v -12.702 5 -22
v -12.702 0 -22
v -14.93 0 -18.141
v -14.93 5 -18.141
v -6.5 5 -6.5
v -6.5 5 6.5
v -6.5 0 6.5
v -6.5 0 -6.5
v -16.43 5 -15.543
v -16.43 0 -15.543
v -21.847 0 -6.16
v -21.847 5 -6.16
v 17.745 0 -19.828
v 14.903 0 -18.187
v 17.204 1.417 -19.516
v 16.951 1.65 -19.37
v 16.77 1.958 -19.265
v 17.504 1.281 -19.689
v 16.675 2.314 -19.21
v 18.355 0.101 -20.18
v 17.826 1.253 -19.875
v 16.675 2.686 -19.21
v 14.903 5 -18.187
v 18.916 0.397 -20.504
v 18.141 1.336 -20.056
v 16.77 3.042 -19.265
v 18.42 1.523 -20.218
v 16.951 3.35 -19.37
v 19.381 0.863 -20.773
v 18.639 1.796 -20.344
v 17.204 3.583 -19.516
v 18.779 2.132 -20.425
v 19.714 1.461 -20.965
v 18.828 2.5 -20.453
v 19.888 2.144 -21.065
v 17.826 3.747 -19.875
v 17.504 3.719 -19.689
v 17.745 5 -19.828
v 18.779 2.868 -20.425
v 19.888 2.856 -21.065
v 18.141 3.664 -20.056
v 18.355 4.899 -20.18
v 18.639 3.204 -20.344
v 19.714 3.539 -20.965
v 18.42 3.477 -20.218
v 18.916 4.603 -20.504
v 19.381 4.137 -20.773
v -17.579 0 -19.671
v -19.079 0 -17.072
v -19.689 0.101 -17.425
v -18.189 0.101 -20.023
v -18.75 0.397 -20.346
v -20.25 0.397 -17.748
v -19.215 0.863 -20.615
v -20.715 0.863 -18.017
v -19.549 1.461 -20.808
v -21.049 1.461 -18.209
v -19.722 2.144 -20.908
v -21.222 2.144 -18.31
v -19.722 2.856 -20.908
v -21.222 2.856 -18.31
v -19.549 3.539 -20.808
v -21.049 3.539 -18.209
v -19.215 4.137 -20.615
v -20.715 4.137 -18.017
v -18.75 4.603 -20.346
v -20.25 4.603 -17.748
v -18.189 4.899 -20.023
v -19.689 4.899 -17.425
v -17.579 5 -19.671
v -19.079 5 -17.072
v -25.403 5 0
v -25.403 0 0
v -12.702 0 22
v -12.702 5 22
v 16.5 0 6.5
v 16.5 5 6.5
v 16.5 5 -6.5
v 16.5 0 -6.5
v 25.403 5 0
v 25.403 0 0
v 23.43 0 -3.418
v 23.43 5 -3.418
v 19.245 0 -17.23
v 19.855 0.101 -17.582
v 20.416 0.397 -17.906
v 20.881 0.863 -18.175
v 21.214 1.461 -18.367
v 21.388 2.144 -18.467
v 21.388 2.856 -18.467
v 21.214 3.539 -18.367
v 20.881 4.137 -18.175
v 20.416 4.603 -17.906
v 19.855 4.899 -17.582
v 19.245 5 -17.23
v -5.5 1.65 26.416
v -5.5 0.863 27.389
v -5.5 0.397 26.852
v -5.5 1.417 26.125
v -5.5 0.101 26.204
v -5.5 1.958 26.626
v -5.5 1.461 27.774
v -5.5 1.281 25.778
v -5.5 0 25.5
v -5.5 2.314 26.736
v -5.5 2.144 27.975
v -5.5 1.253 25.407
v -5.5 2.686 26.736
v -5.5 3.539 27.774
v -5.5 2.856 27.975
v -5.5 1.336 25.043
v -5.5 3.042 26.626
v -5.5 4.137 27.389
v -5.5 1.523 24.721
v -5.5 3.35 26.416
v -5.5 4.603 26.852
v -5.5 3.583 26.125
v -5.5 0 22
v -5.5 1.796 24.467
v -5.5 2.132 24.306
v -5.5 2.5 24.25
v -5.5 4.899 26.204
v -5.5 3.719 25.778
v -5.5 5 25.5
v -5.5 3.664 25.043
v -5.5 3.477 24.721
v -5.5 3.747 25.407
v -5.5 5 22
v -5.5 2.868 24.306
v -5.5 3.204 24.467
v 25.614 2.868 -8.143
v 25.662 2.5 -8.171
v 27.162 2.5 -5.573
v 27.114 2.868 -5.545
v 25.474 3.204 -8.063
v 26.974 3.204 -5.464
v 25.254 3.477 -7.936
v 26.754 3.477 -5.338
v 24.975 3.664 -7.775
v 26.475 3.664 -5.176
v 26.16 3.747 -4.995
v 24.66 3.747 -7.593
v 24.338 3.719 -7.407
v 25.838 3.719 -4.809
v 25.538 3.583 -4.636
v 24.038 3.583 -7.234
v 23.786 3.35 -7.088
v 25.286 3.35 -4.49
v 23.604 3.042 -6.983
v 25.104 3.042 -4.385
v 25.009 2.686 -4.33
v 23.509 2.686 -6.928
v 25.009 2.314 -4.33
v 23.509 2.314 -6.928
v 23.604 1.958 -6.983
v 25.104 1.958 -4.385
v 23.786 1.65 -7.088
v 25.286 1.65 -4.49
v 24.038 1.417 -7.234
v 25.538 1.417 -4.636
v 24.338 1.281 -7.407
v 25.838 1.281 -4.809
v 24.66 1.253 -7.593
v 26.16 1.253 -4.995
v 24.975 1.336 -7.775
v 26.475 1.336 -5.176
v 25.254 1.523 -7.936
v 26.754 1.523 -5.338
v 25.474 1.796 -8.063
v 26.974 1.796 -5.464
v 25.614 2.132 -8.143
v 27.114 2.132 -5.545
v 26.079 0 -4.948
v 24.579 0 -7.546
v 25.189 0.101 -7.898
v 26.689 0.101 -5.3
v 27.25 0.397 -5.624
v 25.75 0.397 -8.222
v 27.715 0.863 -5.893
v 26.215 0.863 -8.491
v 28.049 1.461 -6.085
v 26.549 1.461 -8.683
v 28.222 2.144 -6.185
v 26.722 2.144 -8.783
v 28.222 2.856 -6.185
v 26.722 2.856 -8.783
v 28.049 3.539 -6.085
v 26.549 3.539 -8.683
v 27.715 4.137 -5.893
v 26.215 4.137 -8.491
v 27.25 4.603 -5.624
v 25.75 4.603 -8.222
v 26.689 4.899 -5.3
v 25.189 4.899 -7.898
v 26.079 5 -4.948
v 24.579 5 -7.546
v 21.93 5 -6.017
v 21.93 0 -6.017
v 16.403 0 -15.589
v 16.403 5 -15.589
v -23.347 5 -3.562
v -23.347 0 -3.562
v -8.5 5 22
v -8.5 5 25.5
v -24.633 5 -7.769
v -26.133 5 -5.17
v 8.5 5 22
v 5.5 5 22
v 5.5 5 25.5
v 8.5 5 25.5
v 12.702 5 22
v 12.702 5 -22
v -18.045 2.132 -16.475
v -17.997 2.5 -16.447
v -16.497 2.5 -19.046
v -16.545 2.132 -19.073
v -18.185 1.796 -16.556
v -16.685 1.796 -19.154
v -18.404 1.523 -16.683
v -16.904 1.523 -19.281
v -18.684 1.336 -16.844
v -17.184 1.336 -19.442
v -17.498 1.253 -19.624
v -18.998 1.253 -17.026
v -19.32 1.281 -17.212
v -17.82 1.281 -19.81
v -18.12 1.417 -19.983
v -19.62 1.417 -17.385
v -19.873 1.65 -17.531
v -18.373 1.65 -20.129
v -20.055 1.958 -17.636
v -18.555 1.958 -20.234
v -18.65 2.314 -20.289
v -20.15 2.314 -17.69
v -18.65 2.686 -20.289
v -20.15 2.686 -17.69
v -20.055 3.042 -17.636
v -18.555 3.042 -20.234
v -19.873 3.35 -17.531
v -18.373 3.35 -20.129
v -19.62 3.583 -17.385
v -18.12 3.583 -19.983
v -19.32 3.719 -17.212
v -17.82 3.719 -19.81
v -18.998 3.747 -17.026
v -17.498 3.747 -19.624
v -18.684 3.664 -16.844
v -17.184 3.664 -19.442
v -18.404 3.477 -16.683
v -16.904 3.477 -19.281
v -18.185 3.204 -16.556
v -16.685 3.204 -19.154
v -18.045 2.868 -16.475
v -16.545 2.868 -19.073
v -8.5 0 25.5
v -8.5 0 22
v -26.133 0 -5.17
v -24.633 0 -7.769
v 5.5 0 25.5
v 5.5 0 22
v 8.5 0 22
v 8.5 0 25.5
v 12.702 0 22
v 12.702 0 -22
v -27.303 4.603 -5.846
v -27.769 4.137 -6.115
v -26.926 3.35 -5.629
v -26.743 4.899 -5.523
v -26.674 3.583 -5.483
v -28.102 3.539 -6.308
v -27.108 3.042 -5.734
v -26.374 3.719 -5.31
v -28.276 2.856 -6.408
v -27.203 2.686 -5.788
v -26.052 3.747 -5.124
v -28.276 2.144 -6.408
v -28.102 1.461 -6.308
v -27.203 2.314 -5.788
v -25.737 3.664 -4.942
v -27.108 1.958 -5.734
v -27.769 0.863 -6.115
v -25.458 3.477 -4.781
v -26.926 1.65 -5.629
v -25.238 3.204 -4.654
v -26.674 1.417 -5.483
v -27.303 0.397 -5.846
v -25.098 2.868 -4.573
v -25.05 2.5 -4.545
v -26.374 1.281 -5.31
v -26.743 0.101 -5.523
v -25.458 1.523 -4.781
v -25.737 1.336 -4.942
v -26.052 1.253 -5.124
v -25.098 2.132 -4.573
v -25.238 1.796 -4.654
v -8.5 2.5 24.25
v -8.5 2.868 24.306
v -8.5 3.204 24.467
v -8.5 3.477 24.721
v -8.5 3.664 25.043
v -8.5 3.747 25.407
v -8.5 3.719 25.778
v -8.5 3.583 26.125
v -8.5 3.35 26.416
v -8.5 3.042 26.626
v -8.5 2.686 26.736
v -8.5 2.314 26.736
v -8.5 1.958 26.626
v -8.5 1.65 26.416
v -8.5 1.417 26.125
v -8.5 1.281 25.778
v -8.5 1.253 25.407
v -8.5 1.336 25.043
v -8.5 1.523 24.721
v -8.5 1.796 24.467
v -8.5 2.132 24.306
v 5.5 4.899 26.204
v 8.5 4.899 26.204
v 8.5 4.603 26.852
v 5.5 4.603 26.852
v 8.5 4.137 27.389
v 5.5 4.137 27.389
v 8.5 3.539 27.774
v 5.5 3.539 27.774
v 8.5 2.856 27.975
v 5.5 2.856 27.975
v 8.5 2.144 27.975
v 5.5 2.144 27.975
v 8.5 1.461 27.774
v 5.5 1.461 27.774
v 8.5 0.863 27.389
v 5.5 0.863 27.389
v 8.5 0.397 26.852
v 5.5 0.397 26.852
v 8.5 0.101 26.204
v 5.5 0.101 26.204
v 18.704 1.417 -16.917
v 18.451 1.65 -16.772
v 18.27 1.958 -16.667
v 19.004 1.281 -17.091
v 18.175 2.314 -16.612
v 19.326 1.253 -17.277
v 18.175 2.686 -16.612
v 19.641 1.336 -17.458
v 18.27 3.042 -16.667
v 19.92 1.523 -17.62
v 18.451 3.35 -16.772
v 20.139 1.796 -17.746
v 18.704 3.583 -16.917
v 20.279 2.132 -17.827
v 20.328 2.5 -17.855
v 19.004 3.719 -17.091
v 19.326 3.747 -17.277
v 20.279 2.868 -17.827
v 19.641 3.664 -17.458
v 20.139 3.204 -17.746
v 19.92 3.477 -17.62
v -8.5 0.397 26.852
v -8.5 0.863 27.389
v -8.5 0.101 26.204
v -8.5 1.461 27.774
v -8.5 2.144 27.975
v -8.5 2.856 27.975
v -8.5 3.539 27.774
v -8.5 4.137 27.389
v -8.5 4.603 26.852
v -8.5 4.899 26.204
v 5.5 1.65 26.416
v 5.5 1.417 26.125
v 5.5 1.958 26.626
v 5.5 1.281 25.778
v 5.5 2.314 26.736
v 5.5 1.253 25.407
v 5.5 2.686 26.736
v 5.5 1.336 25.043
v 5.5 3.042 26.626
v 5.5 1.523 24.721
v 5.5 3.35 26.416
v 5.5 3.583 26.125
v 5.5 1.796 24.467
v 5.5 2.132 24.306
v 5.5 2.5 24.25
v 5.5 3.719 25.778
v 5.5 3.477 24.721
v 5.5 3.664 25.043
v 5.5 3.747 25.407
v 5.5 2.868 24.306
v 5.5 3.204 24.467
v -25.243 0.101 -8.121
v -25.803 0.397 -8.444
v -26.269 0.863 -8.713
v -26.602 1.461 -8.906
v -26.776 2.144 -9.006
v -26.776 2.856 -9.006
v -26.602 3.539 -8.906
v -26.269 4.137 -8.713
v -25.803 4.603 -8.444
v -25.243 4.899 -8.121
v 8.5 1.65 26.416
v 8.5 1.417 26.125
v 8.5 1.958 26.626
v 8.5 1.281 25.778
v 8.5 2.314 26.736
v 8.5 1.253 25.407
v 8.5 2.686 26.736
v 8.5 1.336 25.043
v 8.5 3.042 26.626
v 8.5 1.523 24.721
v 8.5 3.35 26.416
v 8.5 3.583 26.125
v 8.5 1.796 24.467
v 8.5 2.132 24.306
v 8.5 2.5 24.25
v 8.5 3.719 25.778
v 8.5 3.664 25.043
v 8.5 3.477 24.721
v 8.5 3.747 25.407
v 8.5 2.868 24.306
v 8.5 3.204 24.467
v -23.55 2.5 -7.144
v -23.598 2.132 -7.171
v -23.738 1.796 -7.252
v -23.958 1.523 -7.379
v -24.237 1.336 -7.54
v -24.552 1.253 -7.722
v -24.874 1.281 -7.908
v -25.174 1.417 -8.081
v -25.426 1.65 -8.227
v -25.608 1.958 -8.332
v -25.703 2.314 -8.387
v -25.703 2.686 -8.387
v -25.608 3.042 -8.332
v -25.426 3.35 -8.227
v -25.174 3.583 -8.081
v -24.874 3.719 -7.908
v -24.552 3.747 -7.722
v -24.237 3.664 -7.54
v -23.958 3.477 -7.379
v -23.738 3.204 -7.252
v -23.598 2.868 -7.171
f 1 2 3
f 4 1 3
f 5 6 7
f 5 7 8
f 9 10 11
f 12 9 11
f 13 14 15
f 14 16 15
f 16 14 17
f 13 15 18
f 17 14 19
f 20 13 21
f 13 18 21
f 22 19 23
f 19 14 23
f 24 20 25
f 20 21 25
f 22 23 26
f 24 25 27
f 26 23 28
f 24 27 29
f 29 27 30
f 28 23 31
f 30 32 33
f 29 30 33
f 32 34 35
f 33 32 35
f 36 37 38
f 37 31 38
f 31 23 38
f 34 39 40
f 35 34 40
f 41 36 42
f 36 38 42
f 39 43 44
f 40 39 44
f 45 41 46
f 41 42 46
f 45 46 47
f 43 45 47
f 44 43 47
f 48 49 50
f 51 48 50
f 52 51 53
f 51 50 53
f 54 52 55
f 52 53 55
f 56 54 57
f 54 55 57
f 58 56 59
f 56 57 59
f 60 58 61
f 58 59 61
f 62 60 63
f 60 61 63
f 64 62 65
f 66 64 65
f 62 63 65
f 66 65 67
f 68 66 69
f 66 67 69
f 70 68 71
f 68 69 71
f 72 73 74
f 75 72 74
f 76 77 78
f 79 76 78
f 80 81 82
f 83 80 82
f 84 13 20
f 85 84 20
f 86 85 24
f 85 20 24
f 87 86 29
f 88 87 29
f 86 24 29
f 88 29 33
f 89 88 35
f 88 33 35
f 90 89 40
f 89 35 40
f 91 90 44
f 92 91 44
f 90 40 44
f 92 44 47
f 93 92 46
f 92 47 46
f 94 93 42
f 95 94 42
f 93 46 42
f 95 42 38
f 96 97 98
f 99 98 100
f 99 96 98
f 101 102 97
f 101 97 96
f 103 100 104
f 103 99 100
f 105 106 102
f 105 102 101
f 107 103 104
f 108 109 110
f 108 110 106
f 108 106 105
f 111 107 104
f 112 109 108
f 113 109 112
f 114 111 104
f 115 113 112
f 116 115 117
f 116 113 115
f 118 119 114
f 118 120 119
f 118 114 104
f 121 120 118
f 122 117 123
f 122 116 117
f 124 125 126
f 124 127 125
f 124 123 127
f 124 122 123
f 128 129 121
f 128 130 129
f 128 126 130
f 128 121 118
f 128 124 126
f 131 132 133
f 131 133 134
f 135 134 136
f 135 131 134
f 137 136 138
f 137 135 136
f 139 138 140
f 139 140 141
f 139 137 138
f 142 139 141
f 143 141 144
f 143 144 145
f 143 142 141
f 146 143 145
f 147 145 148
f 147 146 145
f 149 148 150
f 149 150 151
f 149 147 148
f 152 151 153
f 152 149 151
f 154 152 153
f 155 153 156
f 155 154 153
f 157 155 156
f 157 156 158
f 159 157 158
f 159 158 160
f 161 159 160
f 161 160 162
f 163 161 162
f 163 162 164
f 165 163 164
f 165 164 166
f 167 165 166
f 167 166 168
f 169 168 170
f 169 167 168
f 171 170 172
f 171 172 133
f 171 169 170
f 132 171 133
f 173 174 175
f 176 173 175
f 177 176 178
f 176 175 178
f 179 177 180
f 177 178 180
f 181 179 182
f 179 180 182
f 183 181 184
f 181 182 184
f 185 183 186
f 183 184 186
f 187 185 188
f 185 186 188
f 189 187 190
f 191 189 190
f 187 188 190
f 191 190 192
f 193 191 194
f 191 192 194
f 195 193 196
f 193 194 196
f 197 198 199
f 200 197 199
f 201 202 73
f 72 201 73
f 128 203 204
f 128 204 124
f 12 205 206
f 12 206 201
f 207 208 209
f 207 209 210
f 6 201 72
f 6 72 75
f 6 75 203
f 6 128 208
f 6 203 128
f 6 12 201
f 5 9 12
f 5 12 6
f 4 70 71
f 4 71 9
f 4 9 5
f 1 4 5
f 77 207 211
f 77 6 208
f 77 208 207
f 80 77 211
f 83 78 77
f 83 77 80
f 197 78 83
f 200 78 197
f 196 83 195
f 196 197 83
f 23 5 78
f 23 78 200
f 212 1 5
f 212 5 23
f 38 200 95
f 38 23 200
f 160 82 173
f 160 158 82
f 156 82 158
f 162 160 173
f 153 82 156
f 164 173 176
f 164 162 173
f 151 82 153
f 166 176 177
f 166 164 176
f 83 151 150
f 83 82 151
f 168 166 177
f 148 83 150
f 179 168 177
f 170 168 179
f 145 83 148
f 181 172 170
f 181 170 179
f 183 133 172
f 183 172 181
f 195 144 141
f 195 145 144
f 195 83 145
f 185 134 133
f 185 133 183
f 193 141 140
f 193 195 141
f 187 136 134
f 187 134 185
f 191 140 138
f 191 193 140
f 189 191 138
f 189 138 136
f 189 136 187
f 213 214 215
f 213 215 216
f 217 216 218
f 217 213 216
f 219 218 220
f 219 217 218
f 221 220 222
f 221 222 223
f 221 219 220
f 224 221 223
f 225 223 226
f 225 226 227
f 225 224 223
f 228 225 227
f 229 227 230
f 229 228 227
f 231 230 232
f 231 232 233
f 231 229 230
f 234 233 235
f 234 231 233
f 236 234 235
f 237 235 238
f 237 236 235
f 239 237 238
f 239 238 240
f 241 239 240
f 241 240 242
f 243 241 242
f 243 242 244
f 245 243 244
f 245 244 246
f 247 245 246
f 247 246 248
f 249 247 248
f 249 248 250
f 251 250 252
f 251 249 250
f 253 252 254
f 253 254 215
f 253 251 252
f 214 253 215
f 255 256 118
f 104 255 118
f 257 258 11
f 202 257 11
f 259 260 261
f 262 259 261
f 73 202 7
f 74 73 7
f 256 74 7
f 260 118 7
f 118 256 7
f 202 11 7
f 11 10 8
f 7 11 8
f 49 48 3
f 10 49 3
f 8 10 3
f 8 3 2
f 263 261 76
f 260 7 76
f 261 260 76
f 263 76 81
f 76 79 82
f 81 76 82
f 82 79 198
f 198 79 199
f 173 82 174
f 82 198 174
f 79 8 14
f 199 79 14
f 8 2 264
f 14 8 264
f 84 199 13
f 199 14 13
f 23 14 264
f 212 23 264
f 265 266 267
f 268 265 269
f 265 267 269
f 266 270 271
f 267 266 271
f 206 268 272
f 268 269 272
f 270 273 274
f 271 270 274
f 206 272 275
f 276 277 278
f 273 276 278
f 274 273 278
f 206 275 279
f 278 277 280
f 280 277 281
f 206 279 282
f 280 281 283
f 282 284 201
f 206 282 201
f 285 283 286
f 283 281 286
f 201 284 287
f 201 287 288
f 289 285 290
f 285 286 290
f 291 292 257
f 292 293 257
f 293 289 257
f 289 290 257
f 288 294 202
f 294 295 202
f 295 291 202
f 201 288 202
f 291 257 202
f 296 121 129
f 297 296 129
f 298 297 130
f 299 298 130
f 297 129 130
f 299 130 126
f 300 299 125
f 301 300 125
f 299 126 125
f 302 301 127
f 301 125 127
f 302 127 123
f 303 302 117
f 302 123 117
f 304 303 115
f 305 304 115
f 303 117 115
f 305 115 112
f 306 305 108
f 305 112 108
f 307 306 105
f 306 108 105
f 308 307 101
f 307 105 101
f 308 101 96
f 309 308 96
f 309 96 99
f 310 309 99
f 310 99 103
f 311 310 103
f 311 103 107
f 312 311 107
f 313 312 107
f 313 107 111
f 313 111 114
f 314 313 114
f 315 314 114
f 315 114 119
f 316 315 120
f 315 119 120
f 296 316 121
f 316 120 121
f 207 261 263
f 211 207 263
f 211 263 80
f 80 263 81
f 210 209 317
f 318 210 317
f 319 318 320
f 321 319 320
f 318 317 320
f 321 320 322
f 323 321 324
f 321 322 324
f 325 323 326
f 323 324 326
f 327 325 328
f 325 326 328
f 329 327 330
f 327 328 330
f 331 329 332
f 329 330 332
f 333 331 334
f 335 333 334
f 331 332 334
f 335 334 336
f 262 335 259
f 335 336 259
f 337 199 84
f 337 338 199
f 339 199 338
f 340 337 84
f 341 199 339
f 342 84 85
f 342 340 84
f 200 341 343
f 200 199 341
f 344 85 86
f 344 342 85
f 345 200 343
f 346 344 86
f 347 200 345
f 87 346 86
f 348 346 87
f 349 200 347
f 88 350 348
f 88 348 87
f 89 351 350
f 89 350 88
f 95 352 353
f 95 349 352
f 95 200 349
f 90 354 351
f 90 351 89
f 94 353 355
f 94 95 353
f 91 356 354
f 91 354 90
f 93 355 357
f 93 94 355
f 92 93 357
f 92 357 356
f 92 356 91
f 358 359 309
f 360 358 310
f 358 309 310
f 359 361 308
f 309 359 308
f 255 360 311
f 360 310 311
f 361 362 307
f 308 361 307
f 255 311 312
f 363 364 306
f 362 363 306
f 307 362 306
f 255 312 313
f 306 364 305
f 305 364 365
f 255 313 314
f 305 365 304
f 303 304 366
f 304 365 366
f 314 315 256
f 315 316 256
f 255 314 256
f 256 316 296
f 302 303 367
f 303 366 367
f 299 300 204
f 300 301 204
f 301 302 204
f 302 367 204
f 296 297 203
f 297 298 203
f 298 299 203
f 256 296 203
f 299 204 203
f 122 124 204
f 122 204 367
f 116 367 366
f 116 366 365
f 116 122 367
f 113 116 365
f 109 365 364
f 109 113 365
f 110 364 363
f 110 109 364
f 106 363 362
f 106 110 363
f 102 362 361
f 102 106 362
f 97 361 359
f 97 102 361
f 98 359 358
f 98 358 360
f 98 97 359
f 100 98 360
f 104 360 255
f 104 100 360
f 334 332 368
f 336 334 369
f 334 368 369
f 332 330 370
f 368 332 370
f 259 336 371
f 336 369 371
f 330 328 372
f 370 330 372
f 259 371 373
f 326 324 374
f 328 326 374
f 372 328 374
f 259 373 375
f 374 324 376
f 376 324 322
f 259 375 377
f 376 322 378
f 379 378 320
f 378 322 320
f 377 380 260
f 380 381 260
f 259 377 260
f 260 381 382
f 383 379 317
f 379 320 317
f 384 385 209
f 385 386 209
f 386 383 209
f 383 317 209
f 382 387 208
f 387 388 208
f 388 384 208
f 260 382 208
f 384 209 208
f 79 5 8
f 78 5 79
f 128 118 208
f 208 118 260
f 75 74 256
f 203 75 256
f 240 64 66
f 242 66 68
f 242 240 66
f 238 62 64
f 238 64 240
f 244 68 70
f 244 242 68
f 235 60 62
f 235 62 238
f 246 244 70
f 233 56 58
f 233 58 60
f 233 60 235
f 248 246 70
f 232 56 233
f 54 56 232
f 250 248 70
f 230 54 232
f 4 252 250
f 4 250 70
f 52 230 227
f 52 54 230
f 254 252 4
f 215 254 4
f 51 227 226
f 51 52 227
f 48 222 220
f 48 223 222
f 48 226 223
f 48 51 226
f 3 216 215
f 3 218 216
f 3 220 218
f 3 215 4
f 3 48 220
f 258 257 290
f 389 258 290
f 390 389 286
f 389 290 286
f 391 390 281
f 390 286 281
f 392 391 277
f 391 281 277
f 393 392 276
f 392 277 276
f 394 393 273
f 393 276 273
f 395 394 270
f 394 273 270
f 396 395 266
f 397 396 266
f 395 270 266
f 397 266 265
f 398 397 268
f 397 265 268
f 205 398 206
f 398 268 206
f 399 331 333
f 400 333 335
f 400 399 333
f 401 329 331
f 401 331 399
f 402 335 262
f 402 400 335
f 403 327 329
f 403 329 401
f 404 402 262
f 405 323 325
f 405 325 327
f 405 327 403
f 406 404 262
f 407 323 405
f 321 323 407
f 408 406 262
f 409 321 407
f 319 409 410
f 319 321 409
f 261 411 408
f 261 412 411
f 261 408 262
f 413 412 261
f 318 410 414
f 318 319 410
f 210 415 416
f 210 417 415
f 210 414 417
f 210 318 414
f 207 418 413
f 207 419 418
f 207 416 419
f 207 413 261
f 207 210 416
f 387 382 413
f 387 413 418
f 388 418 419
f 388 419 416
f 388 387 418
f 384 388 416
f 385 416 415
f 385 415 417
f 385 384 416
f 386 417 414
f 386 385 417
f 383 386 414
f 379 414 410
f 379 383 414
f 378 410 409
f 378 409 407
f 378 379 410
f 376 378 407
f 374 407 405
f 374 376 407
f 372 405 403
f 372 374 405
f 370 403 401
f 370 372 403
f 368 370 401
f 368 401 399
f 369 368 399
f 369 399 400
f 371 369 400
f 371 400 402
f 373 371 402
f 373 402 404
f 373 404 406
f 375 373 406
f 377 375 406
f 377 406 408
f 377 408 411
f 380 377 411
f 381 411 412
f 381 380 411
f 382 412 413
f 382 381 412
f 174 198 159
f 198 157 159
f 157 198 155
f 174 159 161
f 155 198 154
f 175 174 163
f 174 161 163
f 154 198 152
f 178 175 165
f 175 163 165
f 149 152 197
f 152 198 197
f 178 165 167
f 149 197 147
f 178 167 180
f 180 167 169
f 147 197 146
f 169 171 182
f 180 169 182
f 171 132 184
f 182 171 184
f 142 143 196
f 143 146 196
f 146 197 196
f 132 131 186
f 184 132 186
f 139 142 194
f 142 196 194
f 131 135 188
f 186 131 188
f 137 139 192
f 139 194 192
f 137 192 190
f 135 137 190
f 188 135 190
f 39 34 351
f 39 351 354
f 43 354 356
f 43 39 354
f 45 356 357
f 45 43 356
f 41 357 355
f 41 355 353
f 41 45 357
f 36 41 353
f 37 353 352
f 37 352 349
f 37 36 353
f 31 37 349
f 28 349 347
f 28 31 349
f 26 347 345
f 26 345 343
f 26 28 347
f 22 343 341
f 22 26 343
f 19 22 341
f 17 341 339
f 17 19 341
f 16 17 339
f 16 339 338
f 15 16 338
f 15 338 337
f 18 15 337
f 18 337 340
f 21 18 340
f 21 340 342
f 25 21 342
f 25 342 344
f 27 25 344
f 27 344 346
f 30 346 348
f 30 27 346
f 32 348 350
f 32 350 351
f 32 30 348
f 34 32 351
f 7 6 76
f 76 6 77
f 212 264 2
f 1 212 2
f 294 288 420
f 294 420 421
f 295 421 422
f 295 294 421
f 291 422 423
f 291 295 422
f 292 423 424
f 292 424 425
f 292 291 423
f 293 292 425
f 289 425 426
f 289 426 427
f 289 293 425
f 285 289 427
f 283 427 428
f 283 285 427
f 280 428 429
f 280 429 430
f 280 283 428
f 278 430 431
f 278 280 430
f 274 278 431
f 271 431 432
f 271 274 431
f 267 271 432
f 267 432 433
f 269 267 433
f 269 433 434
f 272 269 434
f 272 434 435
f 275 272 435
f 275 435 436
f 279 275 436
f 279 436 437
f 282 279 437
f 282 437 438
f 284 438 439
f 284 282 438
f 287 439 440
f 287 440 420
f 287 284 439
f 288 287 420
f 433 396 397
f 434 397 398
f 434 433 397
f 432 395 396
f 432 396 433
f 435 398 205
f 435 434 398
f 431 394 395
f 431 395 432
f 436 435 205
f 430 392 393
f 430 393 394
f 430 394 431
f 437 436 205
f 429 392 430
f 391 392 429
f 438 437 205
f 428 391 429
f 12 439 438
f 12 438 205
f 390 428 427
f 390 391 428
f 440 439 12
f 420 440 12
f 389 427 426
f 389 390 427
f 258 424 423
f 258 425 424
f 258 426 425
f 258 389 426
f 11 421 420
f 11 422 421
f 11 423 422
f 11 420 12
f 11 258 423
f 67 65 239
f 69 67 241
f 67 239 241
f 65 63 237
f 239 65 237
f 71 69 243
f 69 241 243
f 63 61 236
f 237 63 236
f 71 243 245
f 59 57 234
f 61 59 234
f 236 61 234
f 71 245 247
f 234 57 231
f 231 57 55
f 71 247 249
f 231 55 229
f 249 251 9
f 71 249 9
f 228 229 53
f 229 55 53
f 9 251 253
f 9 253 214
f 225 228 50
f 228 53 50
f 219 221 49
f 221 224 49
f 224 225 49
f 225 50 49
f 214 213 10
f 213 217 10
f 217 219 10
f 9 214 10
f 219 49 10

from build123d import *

# Parameters (mm, degrees)
BOSS_EXTRUDE1_DEPTH     = 5
BOSS_EXTRUDE2_START     = 5.5
SKETCH2_R               = 1.25
BOSS_EXTRUDE2_DEPTH     = 3
CIRPATTERN1_START       = -8.29907709
CIRPATTERN1_OUTLINE_R   = 1.25
CIRPATTERN1_DEPTH       = 3
CIRPATTERN1_START_2     = 5.754432
CIRPATTERN1_2_OUTLINE_R = 1.25
CIRPATTERN1_2_DEPTH     = 3
CIRPATTERN1_START_3     = -8.588604314
CIRPATTERN1_3_OUTLINE_R = 1.25
CIRPATTERN1_3_DEPTH     = 3
CIRPATTERN1_START_4     = 5.245568
CIRPATTERN1_4_OUTLINE_R = 1.25
CIRPATTERN1_4_DEPTH     = 3
CUT_EXTRUDE1_REACH      = 42.122
SKETCH3_W               = 23
SKETCH3_H               = 13


# Read off the part's stored shape, not the designer's step: CirPattern1
with BuildPart() as part:
    # Sketch1 → Boss-Extrude1 (new body)
    with BuildSketch(Plane(origin=(0, 0, 0), x_dir=(1, 0, 0), z_dir=(0, 1, 0))):
        Polygon((25.403411844, 0), (12.701705922, 22), (-12.701705922, 22), (-25.403411844, 0), (-12.701705922, -22), (12.701705922, -22), align=None)
    extrude(amount=BOSS_EXTRUDE1_DEPTH)

    # Sketch2 → Boss-Extrude2 (add)
    with BuildSketch(Plane(origin=(0, 0, 0), x_dir=(0, 0, -1), z_dir=(1, 0, 0)).offset(BOSS_EXTRUDE2_START)):
        with BuildLine():
            Line((-22, 5), (-25.5, 5))
            ThreePointArc((-25.5, 5), (-28, 2.5), (-25.5, 0))
            Line((-25.5, 0), (-22, 0))
            Line((-22, 0), (-22, 5))
        make_face()
        with Locations((-25.5, 2.5)):
            Circle(SKETCH2_R, mode=Mode.SUBTRACT)
    boss_extrude2 = extrude(amount=BOSS_EXTRUDE2_DEPTH)

    # Mirror1: Boss-Extrude2 across plane
    add(boss_extrude2.mirror(Plane(origin=(0, 0, 0), x_dir=(0, 0, 1), z_dir=(1, 0, 0))))

    # CirPattern1 outline → CirPattern1 (add)
    with BuildSketch(Plane(origin=(0, 0, 0), x_dir=(0.8660254037844362, 0, -0.5000000000000042), z_dir=(0.5000000000000042, 0, 0.8660254037844363)).offset(CIRPATTERN1_START)):
        with BuildLine():
            Line((25.281685655, 5), (22, 5))
            Line((22, 5), (22, 0))
            Line((22, 0), (25.281685655, 0))
            ThreePointArc((25.281685655, 0), (27.781685655, 2.5), (25.281685655, 5))
        make_face()
        with Locations((25.281685655, 2.5)):
            Circle(CIRPATTERN1_OUTLINE_R, mode=Mode.SUBTRACT)
    extrude(amount=CIRPATTERN1_DEPTH)

    # CirPattern1 2 outline → CirPattern1 2 (add)
    with BuildSketch(Plane(origin=(0, 0, 0), x_dir=(0.8660254037844362, 0, -0.5000000000000042), z_dir=(0.5000000000000042, 0, 0.8660254037844363)).offset(CIRPATTERN1_START_2)):
        with BuildLine():
            ThreePointArc((25.059310849, 0), (27.559310849, 2.5), (25.059310849, 5))
            Line((25.059310849, 5), (22, 5))
            Line((22, 5), (22, 0))
            Line((22, 0), (25.059310849, 0))
        make_face()
        with Locations((25.059310849, 2.5)):
            Circle(CIRPATTERN1_2_OUTLINE_R, mode=Mode.SUBTRACT)
    extrude(amount=CIRPATTERN1_2_DEPTH)

    # CirPattern1 3 outline → CirPattern1 3 (add)
    with BuildSketch(Plane(origin=(0, 0, 0), x_dir=(0.8660254037844431, 0, 0.4999999999999921), z_dir=(0.4999999999999921, 0, -0.8660254037844433)).offset(CIRPATTERN1_START_3)):
        with BuildLine():
            Line((-25.216838483, -5), (-22, -5))
            Line((-22, -5), (-22, 0))
            Line((-22, 0), (-25.216838483, 0))
            ThreePointArc((-25.216838483, 0), (-27.716838483, -2.5), (-25.216838483, -5))
        make_face()
        with Locations((-25.216838483, -2.5)):
            Circle(CIRPATTERN1_3_OUTLINE_R, mode=Mode.SUBTRACT)
    extrude(amount=CIRPATTERN1_3_DEPTH)

    # CirPattern1 4 outline → CirPattern1 4 (add)
    with BuildSketch(Plane(origin=(0, 0, 0), x_dir=(0.8660254037844431, 0, 0.4999999999999921), z_dir=(0.4999999999999921, 0, -0.8660254037844433)).offset(CIRPATTERN1_START_4)):
        with BuildLine():
            ThreePointArc((-25.059310849, 0), (-27.559310849, -2.5), (-25.059310849, -5))
            Line((-25.059310849, -5), (-22, -5))
            Line((-22, -5), (-22, 0))
            Line((-22, 0), (-25.059310849, 0))
        make_face()
        with Locations((-25.059310849, -2.5)):
            Circle(CIRPATTERN1_4_OUTLINE_R, mode=Mode.SUBTRACT)
    extrude(amount=CIRPATTERN1_4_DEPTH)

    # Sketch3 → Cut-Extrude1 (cut, up to next)
    with BuildSketch(Plane(origin=(0, 5, 0), x_dir=(1, 0, 0), z_dir=(0, 1, 0)), mode=Mode.PRIVATE) as cut_extrude1_sk1:
        with Locations((5, 0)):
            Rectangle(SKETCH3_W, SKETCH3_H)
    cut_extrude1_tool1 = extrude(cut_extrude1_sk1.sketch, amount=-CUT_EXTRUDE1_REACH, mode=Mode.PRIVATE) & part.part
    add(cut_extrude1_tool1.solids().sort_by_distance((5, 5, 0))[0], mode=Mode.SUBTRACT)


solid = part.part
